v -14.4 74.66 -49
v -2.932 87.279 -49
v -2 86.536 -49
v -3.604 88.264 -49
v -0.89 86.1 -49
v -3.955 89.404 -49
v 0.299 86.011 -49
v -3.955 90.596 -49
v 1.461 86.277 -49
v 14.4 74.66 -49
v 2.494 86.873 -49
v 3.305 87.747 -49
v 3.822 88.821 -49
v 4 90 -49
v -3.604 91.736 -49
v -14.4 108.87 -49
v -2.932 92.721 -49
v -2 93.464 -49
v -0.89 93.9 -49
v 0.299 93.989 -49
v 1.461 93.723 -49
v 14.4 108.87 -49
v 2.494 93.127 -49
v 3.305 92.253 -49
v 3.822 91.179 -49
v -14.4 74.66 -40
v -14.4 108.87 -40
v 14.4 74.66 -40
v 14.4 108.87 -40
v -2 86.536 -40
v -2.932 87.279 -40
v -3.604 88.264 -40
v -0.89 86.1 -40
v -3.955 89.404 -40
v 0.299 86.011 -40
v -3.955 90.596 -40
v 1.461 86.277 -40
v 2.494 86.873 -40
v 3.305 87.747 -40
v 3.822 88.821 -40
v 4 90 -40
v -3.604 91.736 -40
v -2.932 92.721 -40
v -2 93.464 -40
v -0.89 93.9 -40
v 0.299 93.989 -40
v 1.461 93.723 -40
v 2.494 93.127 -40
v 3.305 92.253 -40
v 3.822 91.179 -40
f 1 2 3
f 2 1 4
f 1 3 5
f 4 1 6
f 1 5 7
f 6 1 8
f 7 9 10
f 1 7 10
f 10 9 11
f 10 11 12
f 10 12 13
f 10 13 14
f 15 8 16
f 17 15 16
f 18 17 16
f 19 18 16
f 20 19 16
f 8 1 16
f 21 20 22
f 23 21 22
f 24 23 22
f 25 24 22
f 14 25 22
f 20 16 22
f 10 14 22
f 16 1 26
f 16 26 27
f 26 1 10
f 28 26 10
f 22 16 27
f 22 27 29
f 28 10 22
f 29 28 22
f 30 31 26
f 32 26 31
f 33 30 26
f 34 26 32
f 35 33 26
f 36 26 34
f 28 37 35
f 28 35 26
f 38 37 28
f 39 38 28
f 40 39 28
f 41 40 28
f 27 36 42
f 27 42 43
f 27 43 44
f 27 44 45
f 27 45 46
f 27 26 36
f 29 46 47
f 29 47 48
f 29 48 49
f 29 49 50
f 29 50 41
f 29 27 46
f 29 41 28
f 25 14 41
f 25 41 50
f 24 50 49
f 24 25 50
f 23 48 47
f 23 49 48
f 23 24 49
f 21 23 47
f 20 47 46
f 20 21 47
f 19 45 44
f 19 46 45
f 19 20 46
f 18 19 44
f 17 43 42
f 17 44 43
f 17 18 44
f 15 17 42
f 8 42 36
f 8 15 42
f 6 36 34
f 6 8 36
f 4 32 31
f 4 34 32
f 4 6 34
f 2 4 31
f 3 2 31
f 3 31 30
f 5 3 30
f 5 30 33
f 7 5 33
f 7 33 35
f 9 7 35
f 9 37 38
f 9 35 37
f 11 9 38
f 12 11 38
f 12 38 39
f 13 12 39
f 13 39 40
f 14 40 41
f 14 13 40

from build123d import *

# Parameters (mm, degrees)
CYLINDER1616_R     = 4
CYLINDER1616_DEPTH = 100
BOX642_W           = 28.8
BOX642_H           = 34.21
BOX642_DEPTH       = 9


with BuildPart() as v_lec1616:
    # Cylinder1616 → Cylinder1616 (new body)
    with BuildSketch(Plane.XY):
        Circle(CYLINDER1616_R)
    extrude(amount=CYLINDER1616_DEPTH)


with BuildPart() as cut308:
    # Box642 → Box642 (new body)
    with BuildSketch(Plane(origin=(-14.4, -15.34, 34), x_dir=(1, 0, 0), z_dir=(0, 0, 1))):
        with Locations((14.4, 17.105)):
            Rectangle(BOX642_W, BOX642_H)
    extrude(amount=BOX642_DEPTH)

    # Cut308: cut Válec1616
    add(v_lec1616.part, mode=Mode.SUBTRACT)


with BuildPart() as cut308_1:
    # Cut308 placement: moved
    add(cut308.part.moved(Location((0, 90, -83))))


solid = cut308_1.part
